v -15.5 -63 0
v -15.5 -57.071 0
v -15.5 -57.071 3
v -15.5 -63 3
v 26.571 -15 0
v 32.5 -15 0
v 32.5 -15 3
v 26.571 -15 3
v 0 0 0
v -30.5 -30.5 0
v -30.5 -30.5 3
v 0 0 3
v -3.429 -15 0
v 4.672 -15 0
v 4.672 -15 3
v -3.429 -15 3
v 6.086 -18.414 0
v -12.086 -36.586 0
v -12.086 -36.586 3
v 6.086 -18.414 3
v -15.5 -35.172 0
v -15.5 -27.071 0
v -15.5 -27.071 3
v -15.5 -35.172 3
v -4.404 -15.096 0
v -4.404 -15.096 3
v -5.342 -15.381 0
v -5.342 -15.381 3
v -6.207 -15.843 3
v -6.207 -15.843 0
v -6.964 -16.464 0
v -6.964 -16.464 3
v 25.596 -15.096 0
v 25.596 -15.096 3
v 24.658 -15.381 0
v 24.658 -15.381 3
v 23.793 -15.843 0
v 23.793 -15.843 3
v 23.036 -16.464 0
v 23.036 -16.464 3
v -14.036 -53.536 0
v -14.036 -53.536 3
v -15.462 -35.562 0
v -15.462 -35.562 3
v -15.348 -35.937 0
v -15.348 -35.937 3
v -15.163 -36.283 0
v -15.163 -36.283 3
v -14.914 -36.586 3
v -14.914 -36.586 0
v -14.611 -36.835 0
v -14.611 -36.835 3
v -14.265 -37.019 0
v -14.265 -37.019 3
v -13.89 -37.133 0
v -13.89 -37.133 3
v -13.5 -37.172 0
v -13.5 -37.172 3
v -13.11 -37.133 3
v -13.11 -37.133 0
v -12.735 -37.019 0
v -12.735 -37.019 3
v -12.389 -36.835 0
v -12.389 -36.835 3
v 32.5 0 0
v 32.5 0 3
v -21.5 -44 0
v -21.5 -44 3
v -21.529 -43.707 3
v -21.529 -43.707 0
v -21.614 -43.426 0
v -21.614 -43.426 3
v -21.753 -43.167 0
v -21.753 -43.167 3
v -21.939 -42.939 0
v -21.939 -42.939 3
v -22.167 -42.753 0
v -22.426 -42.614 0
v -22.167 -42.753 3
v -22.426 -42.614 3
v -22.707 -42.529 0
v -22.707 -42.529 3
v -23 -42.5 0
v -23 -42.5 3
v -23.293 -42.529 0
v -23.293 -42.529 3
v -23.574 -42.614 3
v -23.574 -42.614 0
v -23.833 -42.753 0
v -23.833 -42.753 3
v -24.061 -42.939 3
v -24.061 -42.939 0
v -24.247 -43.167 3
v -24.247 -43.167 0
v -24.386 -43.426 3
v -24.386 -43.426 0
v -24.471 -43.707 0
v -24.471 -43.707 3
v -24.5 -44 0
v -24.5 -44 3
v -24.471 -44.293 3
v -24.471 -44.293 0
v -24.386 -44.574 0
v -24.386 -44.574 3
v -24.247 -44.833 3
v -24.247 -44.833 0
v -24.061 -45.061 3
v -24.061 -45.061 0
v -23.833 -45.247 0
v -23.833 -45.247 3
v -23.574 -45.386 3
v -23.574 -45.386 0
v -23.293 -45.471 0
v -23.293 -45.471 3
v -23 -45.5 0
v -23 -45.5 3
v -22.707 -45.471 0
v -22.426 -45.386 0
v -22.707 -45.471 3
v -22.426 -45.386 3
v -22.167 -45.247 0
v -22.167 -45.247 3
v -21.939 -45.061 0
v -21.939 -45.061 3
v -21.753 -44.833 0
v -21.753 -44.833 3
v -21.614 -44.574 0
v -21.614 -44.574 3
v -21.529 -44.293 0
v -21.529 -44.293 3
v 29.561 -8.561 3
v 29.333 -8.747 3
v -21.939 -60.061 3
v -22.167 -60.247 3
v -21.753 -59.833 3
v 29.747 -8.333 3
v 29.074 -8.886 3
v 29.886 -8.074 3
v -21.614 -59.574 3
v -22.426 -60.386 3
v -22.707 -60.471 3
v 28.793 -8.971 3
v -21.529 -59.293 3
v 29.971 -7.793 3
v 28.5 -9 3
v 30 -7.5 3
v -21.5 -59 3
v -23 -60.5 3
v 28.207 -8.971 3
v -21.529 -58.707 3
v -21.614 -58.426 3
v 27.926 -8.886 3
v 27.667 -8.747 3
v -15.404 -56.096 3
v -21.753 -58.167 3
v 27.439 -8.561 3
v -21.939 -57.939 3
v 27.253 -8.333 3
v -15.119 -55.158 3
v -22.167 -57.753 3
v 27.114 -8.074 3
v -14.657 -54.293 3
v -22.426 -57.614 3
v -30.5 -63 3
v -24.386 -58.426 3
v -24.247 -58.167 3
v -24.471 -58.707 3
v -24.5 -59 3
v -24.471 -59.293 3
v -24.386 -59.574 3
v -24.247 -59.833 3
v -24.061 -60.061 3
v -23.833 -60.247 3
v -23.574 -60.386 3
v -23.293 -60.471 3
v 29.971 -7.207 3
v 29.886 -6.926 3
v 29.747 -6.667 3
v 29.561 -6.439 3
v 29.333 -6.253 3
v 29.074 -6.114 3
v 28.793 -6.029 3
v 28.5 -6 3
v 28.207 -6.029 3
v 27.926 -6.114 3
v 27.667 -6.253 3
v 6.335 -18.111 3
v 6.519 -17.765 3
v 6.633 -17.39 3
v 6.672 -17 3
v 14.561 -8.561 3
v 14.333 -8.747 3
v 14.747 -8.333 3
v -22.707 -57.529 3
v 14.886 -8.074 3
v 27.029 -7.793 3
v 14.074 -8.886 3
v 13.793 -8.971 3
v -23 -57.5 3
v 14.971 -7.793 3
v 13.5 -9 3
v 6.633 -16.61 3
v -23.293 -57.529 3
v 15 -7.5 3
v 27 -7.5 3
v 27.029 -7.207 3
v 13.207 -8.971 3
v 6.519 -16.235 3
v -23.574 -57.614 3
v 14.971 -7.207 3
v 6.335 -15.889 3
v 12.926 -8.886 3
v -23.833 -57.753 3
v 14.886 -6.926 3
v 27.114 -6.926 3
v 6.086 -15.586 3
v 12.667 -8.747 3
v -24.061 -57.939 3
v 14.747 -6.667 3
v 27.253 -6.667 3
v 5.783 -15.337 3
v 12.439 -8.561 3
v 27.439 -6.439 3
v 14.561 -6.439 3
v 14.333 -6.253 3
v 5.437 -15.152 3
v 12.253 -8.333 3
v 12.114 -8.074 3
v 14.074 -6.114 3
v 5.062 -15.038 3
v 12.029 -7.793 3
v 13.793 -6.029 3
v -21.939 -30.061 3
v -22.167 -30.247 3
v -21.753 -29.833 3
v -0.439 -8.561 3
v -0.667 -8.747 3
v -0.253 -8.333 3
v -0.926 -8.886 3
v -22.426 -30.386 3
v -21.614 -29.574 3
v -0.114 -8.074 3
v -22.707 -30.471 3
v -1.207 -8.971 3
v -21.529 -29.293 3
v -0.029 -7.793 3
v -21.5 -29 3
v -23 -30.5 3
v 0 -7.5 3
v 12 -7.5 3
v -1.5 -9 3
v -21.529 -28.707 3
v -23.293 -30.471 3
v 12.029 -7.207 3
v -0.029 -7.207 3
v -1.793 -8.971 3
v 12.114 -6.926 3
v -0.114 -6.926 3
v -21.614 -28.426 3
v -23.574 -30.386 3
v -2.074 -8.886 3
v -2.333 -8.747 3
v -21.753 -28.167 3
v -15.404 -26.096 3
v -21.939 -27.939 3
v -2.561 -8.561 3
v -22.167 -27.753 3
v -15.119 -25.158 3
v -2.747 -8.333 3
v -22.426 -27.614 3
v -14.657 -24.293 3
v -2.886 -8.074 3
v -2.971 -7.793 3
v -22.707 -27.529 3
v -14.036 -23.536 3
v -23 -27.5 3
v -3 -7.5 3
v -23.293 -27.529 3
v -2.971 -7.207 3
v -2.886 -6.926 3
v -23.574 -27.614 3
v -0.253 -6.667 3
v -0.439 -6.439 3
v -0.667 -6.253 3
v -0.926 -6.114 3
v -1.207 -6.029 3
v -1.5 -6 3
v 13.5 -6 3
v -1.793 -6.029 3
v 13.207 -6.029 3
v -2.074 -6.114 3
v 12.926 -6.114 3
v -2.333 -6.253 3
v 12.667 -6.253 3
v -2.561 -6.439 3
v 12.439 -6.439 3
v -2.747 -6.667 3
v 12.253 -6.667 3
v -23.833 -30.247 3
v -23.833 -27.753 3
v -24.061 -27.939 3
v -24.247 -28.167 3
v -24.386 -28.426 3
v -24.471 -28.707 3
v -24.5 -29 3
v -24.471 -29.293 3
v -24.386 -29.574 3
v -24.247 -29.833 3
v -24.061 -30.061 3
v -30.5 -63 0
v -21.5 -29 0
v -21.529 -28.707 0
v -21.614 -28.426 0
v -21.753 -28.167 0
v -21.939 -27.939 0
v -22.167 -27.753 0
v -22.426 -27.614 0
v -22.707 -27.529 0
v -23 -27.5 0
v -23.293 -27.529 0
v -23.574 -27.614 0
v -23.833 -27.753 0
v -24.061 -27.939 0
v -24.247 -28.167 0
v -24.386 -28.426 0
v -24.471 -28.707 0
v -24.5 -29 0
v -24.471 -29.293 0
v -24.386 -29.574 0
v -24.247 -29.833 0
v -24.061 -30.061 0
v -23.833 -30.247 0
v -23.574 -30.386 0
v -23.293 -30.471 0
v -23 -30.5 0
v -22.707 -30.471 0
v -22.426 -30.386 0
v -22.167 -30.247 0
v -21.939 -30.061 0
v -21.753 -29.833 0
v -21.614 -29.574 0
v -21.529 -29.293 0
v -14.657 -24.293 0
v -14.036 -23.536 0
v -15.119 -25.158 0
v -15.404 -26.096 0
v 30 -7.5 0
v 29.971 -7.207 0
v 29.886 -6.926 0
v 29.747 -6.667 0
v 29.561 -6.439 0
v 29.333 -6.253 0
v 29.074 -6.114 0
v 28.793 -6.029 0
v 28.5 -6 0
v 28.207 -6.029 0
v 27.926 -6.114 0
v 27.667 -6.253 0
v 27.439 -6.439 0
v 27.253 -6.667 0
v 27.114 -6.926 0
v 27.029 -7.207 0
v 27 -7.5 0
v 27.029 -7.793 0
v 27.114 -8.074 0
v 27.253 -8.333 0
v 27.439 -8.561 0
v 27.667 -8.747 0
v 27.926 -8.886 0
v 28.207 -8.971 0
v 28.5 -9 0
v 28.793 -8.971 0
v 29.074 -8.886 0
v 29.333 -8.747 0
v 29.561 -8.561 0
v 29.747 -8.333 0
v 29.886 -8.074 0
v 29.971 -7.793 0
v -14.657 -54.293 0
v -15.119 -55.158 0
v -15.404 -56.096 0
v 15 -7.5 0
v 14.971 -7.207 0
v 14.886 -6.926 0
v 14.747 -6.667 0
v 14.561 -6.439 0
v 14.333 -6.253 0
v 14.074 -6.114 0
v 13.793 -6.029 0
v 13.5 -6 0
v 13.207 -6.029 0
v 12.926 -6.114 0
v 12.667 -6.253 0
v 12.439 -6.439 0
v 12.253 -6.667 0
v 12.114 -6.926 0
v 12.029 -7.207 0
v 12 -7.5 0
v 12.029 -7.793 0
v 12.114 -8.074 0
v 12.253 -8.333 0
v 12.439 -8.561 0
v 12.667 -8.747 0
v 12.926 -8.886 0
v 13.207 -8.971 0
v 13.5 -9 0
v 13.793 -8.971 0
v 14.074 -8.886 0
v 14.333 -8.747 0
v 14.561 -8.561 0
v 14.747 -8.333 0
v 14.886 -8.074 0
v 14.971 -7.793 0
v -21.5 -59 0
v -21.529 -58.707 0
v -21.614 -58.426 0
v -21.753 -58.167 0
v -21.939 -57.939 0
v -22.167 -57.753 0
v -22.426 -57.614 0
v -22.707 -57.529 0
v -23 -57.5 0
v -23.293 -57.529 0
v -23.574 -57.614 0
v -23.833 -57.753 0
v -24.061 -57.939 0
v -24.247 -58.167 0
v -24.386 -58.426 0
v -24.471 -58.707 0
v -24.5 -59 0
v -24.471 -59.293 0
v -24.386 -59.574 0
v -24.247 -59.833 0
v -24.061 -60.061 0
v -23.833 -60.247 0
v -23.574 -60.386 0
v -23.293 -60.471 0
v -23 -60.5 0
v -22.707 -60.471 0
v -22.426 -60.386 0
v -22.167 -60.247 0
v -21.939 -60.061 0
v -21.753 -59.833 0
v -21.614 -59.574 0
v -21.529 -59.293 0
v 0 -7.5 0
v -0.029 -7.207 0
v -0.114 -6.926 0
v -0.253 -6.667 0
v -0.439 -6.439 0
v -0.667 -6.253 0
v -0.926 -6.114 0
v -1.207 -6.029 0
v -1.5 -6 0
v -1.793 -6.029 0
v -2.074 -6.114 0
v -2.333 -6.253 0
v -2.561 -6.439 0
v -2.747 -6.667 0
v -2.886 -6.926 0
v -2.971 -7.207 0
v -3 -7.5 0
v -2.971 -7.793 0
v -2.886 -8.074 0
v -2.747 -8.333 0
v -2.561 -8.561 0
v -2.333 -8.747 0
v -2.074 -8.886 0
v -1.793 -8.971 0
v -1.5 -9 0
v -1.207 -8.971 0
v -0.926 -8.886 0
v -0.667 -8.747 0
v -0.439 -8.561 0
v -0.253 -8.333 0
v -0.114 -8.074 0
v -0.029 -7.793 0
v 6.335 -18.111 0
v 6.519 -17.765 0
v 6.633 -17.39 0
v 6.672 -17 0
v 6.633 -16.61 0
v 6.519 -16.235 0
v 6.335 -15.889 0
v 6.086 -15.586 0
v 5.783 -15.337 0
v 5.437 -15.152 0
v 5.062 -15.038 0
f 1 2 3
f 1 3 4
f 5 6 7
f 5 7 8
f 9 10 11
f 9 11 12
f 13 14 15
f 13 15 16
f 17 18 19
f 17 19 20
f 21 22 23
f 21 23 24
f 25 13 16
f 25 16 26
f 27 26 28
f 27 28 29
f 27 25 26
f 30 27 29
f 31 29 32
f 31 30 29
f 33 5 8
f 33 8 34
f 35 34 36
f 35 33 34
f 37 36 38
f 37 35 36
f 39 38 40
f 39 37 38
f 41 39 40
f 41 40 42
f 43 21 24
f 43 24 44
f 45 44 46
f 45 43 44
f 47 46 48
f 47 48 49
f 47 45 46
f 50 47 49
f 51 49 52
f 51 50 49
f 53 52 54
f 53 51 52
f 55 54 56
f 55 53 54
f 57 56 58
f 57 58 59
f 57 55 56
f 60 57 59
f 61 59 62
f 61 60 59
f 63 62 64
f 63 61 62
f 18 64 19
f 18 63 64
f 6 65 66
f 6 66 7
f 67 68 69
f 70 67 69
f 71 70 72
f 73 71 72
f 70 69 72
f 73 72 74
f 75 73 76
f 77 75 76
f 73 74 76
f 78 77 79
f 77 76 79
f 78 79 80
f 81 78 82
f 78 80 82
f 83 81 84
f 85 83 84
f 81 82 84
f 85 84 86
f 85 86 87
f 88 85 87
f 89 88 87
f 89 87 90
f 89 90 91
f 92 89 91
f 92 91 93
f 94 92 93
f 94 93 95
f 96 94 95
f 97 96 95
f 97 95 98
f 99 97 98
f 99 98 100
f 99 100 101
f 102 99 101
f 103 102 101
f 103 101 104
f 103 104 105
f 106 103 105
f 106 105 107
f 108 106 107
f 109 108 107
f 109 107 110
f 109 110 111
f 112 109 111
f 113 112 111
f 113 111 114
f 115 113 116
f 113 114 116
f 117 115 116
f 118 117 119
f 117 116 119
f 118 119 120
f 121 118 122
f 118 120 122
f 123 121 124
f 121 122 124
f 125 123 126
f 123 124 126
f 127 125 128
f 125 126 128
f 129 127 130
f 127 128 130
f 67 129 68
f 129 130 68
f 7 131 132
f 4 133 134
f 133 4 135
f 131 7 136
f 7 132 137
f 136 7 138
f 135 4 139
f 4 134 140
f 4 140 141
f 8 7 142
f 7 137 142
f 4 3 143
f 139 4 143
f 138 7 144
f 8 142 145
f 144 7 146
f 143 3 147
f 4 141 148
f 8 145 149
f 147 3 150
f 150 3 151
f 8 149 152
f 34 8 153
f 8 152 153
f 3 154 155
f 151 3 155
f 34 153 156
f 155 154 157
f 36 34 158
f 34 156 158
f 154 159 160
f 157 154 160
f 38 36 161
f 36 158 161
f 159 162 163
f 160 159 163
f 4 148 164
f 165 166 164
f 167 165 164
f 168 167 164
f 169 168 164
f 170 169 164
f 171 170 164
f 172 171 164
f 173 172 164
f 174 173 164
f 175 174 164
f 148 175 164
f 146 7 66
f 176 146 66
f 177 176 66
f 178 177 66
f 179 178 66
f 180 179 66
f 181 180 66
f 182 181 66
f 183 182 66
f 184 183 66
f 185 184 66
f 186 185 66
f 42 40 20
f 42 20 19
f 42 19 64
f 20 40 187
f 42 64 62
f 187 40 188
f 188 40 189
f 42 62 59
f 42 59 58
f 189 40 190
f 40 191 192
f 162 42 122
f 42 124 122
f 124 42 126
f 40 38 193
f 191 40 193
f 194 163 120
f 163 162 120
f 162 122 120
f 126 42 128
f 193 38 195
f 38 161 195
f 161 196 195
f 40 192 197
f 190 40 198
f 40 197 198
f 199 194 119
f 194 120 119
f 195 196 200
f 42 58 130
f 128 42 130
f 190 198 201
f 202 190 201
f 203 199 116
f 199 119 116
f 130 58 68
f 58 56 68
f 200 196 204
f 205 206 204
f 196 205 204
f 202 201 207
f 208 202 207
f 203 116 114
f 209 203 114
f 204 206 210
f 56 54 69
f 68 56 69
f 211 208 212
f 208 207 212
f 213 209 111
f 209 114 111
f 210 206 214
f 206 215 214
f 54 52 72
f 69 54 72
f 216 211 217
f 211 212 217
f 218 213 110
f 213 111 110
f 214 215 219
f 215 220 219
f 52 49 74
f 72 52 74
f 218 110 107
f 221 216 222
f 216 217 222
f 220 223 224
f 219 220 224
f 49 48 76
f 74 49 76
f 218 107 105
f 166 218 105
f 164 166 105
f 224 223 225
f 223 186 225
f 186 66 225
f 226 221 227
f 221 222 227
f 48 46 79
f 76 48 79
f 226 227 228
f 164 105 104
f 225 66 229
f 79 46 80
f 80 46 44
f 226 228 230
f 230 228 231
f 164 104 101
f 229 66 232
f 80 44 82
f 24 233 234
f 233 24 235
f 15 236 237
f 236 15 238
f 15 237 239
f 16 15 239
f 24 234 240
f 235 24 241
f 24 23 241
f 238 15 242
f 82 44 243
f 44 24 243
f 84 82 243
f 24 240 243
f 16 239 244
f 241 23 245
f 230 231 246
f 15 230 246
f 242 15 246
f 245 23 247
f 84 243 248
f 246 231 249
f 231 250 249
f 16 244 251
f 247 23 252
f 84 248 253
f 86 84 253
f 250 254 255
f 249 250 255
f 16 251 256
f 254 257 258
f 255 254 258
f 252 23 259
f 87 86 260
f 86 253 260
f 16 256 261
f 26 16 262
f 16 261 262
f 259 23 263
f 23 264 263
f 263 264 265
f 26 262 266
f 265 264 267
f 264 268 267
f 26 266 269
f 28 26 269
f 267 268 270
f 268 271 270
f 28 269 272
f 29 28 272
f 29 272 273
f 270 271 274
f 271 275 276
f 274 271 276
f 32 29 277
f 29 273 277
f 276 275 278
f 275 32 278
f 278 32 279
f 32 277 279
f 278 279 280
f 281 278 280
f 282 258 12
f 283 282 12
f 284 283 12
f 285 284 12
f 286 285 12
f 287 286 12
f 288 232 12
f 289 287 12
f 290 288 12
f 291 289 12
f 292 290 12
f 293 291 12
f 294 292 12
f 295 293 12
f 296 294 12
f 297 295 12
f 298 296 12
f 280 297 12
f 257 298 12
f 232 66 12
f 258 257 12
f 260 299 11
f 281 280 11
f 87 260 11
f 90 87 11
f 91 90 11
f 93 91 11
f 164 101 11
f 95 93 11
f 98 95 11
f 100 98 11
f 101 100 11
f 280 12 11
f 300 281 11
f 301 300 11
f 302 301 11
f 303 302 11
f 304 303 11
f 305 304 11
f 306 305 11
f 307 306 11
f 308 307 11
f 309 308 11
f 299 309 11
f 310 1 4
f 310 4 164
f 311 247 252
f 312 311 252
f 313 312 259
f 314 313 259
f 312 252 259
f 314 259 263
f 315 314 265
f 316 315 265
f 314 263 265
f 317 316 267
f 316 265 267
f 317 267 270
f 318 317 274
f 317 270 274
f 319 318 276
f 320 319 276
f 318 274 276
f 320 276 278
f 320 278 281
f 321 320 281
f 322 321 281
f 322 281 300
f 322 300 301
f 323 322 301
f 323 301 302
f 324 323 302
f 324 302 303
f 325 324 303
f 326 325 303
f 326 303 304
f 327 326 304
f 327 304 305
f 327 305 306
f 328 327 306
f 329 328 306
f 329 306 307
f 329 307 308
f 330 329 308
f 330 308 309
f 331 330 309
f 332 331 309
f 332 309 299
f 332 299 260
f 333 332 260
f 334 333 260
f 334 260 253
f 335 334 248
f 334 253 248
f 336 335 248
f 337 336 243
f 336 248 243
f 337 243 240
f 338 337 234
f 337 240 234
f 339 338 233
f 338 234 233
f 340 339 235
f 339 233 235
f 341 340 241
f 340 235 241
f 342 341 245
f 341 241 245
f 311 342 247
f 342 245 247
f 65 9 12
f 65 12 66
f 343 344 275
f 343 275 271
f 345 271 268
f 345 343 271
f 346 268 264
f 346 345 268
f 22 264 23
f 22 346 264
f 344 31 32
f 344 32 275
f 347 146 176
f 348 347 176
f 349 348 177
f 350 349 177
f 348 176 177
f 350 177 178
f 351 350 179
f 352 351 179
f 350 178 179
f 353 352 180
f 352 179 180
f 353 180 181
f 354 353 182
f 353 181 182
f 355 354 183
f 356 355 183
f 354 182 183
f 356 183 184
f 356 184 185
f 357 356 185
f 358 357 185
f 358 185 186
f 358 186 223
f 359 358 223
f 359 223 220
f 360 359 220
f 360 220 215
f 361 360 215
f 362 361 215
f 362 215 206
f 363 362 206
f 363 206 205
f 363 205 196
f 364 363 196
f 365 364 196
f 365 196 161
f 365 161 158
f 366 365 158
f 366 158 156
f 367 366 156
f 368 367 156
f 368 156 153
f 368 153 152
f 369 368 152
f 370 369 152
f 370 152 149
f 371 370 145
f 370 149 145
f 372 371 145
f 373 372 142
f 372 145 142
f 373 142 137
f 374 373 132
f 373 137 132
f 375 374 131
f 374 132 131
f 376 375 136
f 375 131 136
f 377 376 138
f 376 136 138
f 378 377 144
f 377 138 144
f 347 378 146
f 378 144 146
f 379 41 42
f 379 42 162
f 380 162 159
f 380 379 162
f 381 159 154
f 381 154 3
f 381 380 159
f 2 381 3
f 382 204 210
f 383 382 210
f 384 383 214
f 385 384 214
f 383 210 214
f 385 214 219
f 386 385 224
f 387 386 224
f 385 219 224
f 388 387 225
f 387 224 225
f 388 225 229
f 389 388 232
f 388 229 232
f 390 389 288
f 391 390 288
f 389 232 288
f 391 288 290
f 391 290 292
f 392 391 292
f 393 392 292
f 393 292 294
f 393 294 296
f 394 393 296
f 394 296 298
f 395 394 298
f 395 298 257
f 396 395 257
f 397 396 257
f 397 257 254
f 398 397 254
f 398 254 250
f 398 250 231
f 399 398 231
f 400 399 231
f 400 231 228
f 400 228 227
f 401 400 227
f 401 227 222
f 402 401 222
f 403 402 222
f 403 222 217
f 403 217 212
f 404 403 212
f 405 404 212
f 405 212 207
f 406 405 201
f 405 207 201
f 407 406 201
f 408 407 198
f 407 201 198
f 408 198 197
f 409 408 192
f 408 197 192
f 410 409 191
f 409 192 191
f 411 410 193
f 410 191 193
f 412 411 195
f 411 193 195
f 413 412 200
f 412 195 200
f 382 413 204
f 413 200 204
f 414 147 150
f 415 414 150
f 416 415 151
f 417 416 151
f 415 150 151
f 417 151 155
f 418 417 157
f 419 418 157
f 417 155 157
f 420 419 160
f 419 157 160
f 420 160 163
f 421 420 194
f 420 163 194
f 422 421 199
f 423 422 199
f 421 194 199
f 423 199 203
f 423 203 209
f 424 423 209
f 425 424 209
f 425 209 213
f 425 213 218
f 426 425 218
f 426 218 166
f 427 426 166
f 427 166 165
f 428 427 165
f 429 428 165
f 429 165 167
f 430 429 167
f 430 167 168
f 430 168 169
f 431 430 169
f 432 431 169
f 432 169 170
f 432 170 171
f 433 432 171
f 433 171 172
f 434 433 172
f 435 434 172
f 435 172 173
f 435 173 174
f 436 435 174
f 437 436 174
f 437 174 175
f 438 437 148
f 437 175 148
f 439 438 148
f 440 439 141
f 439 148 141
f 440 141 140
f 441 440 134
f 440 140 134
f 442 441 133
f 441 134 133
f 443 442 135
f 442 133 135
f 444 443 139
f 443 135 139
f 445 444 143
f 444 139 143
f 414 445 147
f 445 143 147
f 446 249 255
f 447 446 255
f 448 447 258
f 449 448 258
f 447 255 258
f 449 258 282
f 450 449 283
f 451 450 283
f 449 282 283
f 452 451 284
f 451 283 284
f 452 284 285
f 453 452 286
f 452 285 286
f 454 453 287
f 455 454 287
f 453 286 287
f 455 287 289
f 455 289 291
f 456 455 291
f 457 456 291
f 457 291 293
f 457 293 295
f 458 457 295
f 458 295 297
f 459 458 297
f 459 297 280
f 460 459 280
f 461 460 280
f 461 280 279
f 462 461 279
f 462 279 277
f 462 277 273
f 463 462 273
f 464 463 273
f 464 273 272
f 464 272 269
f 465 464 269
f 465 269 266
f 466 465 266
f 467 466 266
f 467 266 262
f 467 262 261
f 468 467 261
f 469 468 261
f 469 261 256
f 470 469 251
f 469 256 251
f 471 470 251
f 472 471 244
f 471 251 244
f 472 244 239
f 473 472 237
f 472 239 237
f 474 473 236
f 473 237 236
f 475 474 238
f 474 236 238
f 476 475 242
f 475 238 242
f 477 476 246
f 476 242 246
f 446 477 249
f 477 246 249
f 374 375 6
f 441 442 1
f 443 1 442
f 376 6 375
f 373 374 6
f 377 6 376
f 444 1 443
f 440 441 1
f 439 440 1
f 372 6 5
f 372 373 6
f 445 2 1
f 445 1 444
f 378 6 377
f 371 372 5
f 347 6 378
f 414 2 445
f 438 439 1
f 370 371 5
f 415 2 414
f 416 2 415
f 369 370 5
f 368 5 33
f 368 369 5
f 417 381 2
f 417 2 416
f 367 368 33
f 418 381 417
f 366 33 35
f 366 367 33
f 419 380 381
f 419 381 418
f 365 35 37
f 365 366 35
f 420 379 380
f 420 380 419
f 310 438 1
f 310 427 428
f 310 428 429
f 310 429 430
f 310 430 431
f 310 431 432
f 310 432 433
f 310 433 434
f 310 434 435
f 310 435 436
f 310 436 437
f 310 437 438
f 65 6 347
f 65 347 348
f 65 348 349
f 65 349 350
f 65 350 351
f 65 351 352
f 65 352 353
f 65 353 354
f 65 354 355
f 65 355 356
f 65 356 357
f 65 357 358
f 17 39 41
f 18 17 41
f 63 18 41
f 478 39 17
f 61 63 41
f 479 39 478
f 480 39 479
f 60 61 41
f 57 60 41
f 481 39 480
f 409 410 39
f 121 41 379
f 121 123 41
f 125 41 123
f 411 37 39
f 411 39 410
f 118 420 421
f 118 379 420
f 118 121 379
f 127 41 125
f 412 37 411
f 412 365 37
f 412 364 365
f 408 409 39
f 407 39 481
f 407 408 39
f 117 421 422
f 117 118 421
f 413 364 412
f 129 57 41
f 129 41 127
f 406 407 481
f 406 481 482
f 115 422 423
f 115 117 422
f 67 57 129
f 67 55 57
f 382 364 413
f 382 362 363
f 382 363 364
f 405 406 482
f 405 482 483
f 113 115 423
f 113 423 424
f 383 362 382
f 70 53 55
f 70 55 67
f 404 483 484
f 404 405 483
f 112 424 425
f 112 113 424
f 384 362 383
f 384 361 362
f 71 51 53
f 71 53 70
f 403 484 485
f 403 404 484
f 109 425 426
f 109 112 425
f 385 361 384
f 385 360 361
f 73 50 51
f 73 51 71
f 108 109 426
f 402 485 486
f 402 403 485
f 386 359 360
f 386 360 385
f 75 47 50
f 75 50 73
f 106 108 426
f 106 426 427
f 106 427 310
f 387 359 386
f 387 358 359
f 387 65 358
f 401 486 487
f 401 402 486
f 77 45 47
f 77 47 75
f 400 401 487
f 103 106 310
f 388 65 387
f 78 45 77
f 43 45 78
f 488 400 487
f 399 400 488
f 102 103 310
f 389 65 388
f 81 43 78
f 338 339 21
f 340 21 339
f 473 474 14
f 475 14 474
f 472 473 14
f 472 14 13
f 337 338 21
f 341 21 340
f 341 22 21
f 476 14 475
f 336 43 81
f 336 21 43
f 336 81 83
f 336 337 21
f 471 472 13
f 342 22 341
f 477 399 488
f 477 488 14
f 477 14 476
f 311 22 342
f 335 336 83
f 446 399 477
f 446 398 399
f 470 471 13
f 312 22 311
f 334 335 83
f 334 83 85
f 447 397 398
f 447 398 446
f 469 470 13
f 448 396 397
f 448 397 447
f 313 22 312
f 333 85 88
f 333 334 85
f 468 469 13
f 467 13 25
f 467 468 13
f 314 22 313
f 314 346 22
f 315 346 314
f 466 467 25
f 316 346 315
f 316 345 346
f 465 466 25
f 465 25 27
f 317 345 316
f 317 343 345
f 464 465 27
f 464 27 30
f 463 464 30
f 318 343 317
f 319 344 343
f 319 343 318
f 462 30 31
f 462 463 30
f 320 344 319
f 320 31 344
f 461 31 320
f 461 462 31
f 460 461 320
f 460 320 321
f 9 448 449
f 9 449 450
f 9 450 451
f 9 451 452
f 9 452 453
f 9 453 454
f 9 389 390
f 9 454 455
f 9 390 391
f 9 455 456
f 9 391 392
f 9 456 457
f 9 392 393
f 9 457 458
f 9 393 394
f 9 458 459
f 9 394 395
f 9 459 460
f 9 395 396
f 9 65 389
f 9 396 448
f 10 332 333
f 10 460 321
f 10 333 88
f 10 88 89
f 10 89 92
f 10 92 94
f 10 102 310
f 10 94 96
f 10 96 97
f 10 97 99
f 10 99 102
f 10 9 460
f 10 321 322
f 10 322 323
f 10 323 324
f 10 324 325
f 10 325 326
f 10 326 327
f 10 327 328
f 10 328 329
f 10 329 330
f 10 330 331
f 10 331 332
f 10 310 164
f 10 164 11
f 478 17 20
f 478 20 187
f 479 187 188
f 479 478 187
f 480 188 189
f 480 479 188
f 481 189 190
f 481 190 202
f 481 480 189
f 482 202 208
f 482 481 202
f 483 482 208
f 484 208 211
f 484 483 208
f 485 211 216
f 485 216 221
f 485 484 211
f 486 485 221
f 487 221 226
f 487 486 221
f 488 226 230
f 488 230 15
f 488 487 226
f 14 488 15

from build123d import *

# Parameters (mm, degrees)
EXTRUDE_1_DEPTH     = 3
SKETCH_2_R          = 1.5
CUT_EXTRUDE_1_DEPTH = 10


with BuildPart() as part:
    # 草图1 → 凸台-拉伸1 (new body)
    with BuildSketch(Plane.XY):
        with BuildLine():
            Line((32.5, 0), (32.5, -15))
            Line((32.5, -15), (26.571067812, -15))
            ThreePointArc((26.571067812, -15), (24.65765065, -15.380602337), (23.035533906, -16.464466094))
            Line((23.035533906, -16.464466094), (-14.035533906, -53.535533906))
            ThreePointArc((-14.035533906, -53.535533906), (-15.119397663, -55.15765065), (-15.5, -57.071067812))
            Line((-15.5, -57.071067812), (-15.5, -63))
            Line((-15.5, -63), (-30.5, -63))
            Line((-30.5, -63), (-30.5, -30.5))
            Line((-30.5, -30.5), (0, 0))
            Line((0, 0), (32.5, 0))
        make_face()
        with BuildLine():
            Line((-12.085786438, -36.585786438), (6.085786438, -18.414213562))
            ThreePointArc((6.085786438, -18.414213562), (6.51933194, -16.234633135), (4.671572875, -15))
            Line((4.671572875, -15), (-3.428932188, -15))
            ThreePointArc((-3.428932188, -15), (-5.34234935, -15.380602337), (-6.964466094, -16.464466094))
            Line((-6.964466094, -16.464466094), (-14.035533906, -23.535533906))
            ThreePointArc((-14.035533906, -23.535533906), (-15.119397663, -25.15765065), (-15.5, -27.071067812))
            Line((-15.5, -27.071067812), (-15.5, -35.171572875))
            ThreePointArc((-15.5, -35.171572875), (-14.265366865, -37.01933194), (-12.085786438, -36.585786438))
        make_face(mode=Mode.SUBTRACT)
    extrude(amount=EXTRUDE_1_DEPTH)

    # 草图2 → 切除-拉伸1 (cut)
    with BuildSketch(Plane.XY.offset(3)):
        with Locations((28.5, -7.5)):
            Circle(SKETCH_2_R)
        with Locations((13.5, -7.5)):
            Circle(SKETCH_2_R)
        with Locations((-1.5, -7.5)):
            Circle(SKETCH_2_R)
        with Locations((-23, -29)):
            Circle(SKETCH_2_R)
        with Locations((-23, -44)):
            Circle(SKETCH_2_R)
        with Locations((-23, -59)):
            Circle(SKETCH_2_R)
    extrude(amount=-CUT_EXTRUDE_1_DEPTH, mode=Mode.SUBTRACT)


solid = part.part
